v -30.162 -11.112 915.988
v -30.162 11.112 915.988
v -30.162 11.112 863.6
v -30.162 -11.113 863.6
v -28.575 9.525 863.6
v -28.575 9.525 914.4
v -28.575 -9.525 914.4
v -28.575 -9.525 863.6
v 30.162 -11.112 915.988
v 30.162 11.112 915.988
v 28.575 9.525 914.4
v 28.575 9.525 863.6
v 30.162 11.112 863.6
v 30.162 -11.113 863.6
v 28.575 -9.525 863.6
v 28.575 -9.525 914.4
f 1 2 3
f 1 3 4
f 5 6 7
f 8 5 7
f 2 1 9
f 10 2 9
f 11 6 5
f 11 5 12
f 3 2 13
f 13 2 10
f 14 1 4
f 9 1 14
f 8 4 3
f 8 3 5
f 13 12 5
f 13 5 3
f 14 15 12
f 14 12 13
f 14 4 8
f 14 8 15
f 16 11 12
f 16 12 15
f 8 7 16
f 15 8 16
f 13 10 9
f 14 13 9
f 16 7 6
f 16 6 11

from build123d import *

# Parameters (mm, degrees)
BOX022_W               = 57.15
BOX022_H               = 19.05
BOX022_DEPTH           = 50.8
BOX023_W               = 60.325
BOX023_H               = 22.225
BOX023_DEPTH           = 52.3875
CUT025_PLACEMENT_ANGLE = 180


with BuildPart() as cube022:
    # Box022 → Box022 (new body)
    with BuildSketch(Plane(origin=(-28.575, -9.525, 0), x_dir=(1, 0, 0), z_dir=(0, 0, 1))):
        with Locations((28.575, 9.525)):
            Rectangle(BOX022_W, BOX022_H)
    extrude(amount=BOX022_DEPTH)


with BuildPart() as steel_cap001:
    # Box023 → Box023 (new body)
    with BuildSketch(Plane(origin=(-30.1625, -11.1125, -1.5875), x_dir=(1, 0, 0), z_dir=(0, 0, 1))):
        with Locations((30.1625, 11.1125)):
            Rectangle(BOX023_W, BOX023_H)
    extrude(amount=BOX023_DEPTH)

    # Cut025: cut Cube022
    add(cube022.part, mode=Mode.SUBTRACT)


with BuildPart() as steel_cap001_1:
    # Cut025 placement: moved
    add(steel_cap001.part.moved(Location((0, 0, 914.4))).rotate(Axis((0, 0, 914.4), (1, 0, 0)), CUT025_PLACEMENT_ANGLE))


solid = steel_cap001_1.part
